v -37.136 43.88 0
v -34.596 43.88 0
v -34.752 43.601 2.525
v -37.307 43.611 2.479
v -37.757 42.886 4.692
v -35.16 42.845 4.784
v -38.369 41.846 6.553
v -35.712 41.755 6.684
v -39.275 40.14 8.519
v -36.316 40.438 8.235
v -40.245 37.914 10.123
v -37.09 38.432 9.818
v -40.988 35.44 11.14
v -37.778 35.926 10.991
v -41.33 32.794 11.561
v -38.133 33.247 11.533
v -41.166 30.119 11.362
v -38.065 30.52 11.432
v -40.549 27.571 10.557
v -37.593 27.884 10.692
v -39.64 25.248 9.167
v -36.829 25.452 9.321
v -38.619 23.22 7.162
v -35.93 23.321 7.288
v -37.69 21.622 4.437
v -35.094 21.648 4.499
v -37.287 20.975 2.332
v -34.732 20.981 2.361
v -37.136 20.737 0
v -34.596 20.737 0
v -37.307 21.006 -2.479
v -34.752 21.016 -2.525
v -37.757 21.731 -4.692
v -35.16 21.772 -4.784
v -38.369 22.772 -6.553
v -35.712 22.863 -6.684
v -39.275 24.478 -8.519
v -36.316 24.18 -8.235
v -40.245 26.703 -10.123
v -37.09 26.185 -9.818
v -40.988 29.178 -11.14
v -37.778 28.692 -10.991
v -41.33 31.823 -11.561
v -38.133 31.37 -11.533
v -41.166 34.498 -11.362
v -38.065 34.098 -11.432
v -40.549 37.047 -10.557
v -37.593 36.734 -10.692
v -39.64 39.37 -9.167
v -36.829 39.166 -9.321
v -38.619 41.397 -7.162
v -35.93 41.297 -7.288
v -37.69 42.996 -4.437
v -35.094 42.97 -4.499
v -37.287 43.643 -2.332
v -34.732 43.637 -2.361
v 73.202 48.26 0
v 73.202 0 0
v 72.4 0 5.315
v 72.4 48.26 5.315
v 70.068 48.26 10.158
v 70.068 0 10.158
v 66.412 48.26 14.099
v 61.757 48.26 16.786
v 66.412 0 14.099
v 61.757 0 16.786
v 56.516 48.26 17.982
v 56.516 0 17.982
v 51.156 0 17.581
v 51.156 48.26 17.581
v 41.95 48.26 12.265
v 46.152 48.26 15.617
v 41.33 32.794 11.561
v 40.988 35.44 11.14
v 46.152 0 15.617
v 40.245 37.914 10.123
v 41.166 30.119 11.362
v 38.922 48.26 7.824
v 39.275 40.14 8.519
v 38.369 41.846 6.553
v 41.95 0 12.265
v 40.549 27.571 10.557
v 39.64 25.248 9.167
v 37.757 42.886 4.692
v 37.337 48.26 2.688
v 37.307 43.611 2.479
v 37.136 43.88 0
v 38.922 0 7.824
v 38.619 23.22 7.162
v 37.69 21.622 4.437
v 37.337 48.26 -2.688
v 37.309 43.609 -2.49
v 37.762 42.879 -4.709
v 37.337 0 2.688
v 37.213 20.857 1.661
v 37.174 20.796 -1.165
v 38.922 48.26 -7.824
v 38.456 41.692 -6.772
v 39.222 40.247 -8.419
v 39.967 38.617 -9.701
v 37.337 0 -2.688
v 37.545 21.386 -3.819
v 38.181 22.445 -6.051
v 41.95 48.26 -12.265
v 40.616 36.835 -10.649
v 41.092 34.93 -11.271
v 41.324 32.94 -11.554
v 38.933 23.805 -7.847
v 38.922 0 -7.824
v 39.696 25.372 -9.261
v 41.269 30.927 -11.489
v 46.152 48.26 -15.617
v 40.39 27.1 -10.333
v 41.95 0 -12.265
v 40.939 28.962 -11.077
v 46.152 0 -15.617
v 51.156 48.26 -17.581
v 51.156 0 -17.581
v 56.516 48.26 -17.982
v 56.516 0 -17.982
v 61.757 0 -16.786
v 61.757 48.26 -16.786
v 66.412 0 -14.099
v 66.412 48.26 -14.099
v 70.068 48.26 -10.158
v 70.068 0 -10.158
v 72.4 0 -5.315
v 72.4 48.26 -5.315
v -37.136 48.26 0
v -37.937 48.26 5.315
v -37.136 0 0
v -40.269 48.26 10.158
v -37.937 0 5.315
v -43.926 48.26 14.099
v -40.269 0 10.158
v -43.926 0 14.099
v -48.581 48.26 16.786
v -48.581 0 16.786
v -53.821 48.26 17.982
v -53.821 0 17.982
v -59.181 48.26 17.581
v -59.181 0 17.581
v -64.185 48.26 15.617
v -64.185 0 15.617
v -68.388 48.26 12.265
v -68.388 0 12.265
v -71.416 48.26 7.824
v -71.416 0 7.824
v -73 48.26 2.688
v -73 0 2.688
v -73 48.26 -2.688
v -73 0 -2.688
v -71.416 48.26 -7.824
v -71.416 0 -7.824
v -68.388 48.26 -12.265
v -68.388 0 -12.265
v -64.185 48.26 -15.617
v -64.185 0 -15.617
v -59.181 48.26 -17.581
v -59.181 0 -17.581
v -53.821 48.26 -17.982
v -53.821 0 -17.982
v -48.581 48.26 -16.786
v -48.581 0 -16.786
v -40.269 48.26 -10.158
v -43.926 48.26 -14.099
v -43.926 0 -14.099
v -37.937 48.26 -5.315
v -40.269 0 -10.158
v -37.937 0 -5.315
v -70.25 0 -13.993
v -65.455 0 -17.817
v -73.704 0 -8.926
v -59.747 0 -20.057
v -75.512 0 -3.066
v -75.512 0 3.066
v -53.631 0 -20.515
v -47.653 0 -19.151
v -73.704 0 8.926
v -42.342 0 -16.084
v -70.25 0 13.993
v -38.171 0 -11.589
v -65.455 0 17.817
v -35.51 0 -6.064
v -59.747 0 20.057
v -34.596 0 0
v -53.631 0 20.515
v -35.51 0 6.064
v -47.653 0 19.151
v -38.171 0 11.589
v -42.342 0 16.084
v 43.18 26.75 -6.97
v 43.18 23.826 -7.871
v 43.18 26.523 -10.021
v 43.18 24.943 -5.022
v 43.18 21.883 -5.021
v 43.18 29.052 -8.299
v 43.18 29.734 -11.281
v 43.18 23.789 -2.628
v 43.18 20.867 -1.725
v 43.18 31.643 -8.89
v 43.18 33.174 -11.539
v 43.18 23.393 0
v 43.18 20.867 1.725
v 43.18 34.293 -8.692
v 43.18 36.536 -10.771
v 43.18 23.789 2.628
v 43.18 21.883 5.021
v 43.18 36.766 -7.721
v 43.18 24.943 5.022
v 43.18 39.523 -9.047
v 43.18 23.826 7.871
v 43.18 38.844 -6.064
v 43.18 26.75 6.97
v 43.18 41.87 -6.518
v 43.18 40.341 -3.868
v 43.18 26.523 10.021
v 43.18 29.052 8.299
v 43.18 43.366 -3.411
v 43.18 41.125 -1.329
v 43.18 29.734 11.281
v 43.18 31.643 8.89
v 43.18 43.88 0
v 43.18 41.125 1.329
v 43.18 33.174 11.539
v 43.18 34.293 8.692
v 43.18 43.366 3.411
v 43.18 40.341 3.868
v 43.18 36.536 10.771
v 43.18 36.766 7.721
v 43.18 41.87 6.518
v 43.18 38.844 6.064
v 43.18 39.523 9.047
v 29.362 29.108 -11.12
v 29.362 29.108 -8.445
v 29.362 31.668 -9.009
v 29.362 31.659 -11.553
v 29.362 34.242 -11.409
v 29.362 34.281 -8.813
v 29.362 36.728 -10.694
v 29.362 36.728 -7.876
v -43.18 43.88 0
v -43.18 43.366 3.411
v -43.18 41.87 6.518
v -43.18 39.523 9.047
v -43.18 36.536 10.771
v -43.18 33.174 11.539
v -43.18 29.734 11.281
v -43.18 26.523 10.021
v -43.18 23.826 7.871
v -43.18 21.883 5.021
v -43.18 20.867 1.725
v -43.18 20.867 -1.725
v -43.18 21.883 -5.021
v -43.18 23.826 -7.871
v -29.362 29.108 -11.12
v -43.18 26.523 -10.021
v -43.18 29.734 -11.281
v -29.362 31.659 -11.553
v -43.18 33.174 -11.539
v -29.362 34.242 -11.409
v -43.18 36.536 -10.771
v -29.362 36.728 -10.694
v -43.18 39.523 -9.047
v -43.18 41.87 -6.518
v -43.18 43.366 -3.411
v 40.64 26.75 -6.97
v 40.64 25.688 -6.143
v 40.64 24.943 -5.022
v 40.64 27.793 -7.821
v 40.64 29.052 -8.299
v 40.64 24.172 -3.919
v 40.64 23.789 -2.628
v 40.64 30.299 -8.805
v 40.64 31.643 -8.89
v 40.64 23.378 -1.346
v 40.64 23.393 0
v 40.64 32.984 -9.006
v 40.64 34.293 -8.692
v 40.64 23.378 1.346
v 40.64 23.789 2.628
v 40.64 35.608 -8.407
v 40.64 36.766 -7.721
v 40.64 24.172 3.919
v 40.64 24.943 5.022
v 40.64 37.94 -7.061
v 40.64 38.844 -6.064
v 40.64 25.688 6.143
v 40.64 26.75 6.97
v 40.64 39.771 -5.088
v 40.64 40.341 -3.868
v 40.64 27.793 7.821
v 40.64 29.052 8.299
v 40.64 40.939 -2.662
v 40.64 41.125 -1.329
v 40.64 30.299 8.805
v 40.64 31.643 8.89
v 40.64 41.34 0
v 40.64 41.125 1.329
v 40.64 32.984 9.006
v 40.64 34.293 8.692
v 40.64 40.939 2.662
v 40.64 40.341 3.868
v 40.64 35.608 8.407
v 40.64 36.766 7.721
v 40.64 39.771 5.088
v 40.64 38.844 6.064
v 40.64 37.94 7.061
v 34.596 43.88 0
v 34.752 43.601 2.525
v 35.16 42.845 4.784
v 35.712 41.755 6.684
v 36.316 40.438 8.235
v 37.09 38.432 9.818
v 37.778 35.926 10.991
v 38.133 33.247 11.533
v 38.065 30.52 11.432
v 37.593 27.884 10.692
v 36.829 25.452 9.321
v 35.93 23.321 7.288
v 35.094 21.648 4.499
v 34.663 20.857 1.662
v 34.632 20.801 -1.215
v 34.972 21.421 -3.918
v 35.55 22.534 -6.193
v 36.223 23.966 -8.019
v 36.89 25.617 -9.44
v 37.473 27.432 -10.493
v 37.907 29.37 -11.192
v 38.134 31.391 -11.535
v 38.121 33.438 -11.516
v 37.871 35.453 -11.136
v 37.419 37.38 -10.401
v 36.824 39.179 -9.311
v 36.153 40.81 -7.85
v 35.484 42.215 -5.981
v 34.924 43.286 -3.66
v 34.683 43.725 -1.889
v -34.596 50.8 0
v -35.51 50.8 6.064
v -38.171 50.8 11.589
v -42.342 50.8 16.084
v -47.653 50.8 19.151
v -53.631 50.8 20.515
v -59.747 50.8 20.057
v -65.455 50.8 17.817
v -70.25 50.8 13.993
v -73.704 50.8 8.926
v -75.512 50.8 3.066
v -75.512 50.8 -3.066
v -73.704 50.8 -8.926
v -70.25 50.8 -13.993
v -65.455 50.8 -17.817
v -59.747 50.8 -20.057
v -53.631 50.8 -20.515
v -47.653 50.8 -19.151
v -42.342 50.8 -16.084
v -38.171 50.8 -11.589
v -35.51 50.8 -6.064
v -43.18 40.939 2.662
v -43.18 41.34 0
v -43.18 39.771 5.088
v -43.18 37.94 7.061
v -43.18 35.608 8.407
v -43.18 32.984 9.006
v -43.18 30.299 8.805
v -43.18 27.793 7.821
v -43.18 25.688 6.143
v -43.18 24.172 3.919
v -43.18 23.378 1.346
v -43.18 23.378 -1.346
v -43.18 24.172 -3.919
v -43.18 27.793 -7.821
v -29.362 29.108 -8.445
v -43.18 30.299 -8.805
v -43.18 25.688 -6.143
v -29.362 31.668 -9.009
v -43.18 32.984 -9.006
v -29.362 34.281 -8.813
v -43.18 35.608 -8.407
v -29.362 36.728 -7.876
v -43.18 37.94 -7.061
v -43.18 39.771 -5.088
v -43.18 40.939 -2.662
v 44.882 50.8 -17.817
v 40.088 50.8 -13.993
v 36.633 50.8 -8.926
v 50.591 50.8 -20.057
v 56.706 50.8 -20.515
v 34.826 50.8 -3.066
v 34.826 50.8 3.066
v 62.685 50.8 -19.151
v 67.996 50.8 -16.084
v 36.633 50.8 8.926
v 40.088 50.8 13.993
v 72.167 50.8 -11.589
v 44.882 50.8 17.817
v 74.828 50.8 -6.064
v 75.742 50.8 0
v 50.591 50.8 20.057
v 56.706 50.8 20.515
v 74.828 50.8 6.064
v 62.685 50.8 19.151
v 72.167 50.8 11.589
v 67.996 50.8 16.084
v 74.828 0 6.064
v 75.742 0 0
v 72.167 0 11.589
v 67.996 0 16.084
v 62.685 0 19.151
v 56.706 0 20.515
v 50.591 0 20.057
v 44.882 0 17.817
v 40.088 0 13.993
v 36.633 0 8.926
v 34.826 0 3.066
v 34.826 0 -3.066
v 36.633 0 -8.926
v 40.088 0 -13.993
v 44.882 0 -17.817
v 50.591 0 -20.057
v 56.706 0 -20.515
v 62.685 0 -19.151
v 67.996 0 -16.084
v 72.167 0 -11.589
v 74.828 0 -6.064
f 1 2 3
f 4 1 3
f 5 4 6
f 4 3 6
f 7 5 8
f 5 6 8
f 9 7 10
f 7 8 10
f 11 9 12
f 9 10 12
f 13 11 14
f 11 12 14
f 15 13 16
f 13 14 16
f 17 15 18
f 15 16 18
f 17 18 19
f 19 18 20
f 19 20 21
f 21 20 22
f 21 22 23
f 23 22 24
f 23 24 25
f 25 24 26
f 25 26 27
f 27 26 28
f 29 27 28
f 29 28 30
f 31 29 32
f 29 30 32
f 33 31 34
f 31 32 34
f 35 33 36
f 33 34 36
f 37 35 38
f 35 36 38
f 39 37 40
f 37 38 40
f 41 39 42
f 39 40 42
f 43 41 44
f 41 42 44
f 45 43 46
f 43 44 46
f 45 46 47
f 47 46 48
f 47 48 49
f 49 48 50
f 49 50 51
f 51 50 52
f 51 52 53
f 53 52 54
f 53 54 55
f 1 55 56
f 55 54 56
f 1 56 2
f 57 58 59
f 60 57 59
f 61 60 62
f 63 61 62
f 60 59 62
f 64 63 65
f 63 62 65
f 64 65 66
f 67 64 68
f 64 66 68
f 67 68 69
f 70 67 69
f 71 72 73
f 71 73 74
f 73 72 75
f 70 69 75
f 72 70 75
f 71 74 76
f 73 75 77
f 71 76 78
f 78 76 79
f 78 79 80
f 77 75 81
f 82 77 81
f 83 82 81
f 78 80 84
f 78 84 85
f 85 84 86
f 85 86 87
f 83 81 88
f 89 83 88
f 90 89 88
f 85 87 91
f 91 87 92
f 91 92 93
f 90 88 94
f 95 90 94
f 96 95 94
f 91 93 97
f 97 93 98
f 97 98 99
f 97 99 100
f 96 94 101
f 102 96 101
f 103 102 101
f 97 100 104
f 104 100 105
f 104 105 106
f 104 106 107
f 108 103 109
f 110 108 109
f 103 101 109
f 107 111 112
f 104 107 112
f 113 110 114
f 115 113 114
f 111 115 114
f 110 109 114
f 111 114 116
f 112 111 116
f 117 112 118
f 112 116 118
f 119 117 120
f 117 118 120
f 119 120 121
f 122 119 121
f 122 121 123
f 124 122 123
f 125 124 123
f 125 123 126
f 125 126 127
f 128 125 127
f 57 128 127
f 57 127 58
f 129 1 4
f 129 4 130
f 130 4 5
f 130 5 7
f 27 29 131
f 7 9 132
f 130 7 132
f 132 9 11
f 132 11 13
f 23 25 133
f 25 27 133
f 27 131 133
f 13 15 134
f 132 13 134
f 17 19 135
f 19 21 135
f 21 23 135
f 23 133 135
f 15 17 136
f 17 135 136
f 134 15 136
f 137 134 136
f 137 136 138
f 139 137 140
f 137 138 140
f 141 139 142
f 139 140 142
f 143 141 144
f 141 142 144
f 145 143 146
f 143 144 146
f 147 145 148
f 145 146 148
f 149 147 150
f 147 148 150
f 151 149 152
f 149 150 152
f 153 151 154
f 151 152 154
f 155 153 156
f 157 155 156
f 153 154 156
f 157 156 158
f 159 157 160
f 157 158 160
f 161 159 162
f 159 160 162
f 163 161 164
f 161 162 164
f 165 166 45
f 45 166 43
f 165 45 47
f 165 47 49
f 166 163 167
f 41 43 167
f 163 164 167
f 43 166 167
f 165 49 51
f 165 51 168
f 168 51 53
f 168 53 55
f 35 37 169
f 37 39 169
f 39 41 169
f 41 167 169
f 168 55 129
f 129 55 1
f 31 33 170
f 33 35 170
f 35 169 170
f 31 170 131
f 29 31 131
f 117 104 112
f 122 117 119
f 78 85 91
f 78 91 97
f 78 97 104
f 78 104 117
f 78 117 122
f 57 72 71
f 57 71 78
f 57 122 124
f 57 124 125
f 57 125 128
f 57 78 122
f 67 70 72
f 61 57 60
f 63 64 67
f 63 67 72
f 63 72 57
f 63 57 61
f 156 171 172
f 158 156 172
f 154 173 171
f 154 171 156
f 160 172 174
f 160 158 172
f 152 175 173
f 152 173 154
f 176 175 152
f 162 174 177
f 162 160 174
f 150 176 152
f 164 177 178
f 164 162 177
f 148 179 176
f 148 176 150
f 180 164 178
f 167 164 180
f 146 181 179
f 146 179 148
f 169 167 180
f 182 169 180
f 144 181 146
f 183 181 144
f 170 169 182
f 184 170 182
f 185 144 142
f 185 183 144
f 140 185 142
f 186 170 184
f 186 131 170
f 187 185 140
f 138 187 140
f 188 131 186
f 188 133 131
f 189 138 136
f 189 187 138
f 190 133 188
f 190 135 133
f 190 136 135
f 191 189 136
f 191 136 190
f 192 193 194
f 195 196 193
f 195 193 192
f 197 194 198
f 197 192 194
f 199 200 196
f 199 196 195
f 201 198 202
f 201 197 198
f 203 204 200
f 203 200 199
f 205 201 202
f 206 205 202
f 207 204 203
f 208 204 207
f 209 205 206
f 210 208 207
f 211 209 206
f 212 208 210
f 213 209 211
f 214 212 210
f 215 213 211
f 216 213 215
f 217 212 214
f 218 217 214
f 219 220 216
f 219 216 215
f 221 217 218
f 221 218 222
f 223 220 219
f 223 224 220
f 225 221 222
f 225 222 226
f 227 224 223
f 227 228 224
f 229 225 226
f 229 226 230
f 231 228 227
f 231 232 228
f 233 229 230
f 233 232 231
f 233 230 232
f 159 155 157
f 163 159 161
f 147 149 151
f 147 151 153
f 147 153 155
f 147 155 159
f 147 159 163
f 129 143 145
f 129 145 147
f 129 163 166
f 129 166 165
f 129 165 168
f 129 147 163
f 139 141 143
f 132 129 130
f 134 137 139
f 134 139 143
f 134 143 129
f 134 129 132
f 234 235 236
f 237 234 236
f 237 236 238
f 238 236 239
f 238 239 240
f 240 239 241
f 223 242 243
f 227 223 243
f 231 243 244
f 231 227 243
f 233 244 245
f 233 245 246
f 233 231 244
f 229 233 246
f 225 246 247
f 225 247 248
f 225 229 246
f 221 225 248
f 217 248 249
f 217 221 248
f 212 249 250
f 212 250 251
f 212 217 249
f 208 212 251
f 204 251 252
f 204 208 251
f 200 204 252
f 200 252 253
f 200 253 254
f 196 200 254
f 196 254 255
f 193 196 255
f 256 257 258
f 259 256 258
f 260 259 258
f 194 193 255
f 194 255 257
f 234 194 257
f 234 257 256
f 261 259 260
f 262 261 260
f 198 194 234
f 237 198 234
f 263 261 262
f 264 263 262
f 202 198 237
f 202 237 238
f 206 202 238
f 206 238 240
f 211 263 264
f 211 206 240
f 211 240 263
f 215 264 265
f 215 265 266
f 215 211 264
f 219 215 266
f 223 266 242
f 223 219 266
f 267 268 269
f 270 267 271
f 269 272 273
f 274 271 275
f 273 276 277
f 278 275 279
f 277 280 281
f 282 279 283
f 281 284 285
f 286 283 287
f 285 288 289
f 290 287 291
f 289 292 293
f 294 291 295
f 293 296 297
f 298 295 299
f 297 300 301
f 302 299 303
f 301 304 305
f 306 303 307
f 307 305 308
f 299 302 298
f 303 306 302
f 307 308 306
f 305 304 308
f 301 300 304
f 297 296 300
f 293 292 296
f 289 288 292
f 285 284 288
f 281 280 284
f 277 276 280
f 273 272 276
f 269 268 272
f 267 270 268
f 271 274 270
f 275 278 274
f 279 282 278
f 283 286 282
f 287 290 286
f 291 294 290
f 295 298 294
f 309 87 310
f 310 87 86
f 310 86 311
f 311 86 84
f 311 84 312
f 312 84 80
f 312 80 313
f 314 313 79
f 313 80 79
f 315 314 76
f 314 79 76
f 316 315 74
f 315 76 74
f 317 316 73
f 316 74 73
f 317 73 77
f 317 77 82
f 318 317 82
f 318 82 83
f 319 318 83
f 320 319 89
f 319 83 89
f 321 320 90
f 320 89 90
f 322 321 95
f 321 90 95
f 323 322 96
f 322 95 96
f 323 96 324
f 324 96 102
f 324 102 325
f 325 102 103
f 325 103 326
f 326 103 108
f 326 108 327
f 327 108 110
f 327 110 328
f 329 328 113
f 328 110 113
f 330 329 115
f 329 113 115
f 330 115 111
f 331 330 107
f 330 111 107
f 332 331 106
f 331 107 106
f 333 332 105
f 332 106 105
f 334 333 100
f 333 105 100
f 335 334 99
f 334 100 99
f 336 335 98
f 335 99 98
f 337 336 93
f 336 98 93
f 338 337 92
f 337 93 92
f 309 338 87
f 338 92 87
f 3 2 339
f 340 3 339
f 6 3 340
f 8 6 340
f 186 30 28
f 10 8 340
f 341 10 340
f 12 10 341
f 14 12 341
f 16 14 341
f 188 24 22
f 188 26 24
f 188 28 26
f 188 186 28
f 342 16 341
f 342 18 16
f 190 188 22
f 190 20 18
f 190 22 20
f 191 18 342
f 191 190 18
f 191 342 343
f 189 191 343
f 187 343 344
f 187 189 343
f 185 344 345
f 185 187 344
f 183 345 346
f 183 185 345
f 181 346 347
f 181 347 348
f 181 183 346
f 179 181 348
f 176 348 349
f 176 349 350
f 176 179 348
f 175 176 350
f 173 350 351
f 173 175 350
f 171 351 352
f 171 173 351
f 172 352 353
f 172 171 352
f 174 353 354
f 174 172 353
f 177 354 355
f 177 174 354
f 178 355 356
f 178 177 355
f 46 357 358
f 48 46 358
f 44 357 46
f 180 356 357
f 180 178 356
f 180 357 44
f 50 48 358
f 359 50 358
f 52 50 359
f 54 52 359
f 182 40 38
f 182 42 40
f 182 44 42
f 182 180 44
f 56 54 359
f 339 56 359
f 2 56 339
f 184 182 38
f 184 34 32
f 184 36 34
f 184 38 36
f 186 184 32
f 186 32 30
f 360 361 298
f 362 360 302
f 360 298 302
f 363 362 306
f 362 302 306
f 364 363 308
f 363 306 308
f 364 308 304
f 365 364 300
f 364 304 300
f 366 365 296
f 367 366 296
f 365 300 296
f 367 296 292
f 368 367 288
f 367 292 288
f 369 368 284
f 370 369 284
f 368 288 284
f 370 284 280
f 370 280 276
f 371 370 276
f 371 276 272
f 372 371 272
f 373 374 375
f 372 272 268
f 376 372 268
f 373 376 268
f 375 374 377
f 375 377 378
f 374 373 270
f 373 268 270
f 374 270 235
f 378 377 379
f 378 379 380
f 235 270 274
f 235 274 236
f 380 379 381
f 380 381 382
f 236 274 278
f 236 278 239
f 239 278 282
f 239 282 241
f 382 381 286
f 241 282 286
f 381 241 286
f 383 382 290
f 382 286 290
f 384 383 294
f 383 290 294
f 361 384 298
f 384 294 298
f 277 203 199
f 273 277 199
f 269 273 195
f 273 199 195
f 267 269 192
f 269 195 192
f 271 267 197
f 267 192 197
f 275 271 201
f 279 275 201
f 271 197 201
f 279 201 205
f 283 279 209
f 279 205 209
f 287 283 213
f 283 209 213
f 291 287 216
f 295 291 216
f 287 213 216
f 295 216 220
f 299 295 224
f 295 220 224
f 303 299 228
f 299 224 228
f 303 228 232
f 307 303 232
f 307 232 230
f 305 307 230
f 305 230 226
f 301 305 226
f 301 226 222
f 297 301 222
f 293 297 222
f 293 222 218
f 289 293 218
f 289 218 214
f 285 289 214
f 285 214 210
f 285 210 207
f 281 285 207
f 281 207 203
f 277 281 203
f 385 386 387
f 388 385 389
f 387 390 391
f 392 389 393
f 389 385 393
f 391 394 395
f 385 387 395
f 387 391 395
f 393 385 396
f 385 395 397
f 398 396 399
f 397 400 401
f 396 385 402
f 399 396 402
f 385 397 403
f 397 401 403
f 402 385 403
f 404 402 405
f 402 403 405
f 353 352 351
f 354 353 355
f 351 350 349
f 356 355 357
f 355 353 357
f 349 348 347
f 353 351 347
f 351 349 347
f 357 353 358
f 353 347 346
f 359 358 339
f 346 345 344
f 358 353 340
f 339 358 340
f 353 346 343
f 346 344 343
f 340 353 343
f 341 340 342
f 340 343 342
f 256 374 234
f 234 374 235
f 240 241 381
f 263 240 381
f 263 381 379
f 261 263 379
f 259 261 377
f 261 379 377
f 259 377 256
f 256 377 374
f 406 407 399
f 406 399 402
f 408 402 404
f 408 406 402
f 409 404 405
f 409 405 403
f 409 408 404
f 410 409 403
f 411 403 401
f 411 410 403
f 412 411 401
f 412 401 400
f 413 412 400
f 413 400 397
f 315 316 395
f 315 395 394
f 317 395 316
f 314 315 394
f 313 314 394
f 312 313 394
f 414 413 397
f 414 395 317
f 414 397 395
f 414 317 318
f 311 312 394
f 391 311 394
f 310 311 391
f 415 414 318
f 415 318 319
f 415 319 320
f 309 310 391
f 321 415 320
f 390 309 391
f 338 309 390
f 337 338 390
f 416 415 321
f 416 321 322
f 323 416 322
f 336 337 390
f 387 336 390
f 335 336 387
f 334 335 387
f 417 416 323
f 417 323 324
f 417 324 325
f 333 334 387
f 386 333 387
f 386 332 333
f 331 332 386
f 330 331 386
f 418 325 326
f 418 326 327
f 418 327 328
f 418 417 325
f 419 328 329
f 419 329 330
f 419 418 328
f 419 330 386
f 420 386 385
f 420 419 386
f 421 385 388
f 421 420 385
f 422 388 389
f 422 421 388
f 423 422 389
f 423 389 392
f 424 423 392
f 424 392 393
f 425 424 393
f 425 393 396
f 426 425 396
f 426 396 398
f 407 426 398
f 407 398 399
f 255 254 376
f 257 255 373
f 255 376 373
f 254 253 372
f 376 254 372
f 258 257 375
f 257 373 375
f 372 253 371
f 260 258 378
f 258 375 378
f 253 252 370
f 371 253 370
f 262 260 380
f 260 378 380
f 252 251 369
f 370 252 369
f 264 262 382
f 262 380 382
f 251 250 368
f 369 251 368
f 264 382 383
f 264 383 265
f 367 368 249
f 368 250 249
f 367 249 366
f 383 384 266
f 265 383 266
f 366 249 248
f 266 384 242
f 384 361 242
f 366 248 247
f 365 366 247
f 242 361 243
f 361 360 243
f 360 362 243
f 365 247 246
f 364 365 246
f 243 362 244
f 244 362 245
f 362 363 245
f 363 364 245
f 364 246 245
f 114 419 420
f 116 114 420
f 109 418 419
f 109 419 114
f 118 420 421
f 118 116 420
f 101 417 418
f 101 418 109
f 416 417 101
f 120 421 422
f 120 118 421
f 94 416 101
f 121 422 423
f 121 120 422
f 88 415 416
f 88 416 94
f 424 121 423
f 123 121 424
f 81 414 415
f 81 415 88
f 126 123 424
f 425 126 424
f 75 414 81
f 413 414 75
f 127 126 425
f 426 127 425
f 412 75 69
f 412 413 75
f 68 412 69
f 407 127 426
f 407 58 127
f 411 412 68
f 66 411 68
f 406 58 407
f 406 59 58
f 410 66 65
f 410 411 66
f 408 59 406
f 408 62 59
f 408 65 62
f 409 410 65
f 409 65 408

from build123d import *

# Parameters (mm, degrees)
F0_R          = 20.5728082759
F1_DEPTH      = 50.8
F2_T          = -2.54
F2_2_T        = -2.54
F3_R          = 11.571366929
F4_DEPTH      = 50.8
F4_DEPTH_BACK = 50.8
F5_DEPTH      = 43.18
F5_DEPTH_BACK = 43.18
F6_T          = -2.54
F7_D          = 17.8308
F9_DEPTH      = 12.7


with BuildPart() as f1:
    # F0 (on Front) → F1 (new body)
    with BuildSketch(Plane.XZ):
        with Locations((-55.168800056, 0)):
            Circle(F0_R)
    extrude(amount=-F1_DEPTH)

    # F2
    f2_openings = [f1.faces().sort_by_distance(p)[0] for p in [
        (-55.1688, 0, 0),
    ]]
    offset(amount=F2_T, openings=f2_openings)


with BuildPart() as f1b:
    # F0 (on Front) → F1, piece 2 (new body)
    with BuildSketch(Plane.XZ):
        with Locations((55.168800056, 0)):
            Circle(F0_R)
    extrude(amount=-F1_DEPTH)

    # F2#2
    f2_2_openings = [f1b.faces().sort_by_distance(p)[0] for p in [
        (55.1688, 0, 0),
    ]]
    offset(amount=F2_2_T, openings=f2_2_openings)


with BuildPart() as f4_tool:
    # F3 (on Right) → F4 (new body, two sides)
    with BuildSketch(Plane.YZ) as f4_sk:
        with Locations((32.3087982833, 0)):
            Circle(F3_R)
    extrude(amount=F4_DEPTH)
    extrude(f4_sk.sketch, amount=-F4_DEPTH_BACK)


with BuildPart() as f1_1:
    add(f1.part)

    # F4: cut by f4_tool
    add(f4_tool.part, mode=Mode.SUBTRACT)


with BuildPart() as f1b_1:
    add(f1b.part)

    # F4: cut by f4_tool
    add(f4_tool.part, mode=Mode.SUBTRACT)


with BuildPart() as f5:
    # F3 (on Right) → F5 (new body, two sides)
    with BuildSketch(Plane.YZ) as f5_sk:
        with Locations((32.3087982833, 0)):
            Circle(F3_R)
    extrude(amount=F5_DEPTH)
    extrude(f5_sk.sketch, amount=-F5_DEPTH_BACK)

    # F6
    f6_openings = [f5.faces().sort_by_distance(p)[0] for p in [
        (-43.18, 32.308798, 0),
    ]]
    offset(amount=F6_T, openings=f6_openings)

    # F7 (through all)
    with Locations(Plane(origin=(0, 0, 0), x_dir=(0, 1, 0), z_dir=(-1, 0, 0))):
        with Locations((32.3087982833, 0)):
            Hole(F7_D / 2)

    # F8 (on Top) → F9 (cut)
    with BuildSketch(Plane.XY):
        Polygon((-29.3624736369, 29.1084013879), (0, 29.1084013879), (29.3624736369, 29.1084013879), (29.3624736369, 36.728400737), (0, 36.728400737), (-29.3624736369, 36.728400737), align=None)
    extrude(amount=-F9_DEPTH, mode=Mode.SUBTRACT)


solid = Compound([f1_1.part, f1b_1.part, f5.part])
